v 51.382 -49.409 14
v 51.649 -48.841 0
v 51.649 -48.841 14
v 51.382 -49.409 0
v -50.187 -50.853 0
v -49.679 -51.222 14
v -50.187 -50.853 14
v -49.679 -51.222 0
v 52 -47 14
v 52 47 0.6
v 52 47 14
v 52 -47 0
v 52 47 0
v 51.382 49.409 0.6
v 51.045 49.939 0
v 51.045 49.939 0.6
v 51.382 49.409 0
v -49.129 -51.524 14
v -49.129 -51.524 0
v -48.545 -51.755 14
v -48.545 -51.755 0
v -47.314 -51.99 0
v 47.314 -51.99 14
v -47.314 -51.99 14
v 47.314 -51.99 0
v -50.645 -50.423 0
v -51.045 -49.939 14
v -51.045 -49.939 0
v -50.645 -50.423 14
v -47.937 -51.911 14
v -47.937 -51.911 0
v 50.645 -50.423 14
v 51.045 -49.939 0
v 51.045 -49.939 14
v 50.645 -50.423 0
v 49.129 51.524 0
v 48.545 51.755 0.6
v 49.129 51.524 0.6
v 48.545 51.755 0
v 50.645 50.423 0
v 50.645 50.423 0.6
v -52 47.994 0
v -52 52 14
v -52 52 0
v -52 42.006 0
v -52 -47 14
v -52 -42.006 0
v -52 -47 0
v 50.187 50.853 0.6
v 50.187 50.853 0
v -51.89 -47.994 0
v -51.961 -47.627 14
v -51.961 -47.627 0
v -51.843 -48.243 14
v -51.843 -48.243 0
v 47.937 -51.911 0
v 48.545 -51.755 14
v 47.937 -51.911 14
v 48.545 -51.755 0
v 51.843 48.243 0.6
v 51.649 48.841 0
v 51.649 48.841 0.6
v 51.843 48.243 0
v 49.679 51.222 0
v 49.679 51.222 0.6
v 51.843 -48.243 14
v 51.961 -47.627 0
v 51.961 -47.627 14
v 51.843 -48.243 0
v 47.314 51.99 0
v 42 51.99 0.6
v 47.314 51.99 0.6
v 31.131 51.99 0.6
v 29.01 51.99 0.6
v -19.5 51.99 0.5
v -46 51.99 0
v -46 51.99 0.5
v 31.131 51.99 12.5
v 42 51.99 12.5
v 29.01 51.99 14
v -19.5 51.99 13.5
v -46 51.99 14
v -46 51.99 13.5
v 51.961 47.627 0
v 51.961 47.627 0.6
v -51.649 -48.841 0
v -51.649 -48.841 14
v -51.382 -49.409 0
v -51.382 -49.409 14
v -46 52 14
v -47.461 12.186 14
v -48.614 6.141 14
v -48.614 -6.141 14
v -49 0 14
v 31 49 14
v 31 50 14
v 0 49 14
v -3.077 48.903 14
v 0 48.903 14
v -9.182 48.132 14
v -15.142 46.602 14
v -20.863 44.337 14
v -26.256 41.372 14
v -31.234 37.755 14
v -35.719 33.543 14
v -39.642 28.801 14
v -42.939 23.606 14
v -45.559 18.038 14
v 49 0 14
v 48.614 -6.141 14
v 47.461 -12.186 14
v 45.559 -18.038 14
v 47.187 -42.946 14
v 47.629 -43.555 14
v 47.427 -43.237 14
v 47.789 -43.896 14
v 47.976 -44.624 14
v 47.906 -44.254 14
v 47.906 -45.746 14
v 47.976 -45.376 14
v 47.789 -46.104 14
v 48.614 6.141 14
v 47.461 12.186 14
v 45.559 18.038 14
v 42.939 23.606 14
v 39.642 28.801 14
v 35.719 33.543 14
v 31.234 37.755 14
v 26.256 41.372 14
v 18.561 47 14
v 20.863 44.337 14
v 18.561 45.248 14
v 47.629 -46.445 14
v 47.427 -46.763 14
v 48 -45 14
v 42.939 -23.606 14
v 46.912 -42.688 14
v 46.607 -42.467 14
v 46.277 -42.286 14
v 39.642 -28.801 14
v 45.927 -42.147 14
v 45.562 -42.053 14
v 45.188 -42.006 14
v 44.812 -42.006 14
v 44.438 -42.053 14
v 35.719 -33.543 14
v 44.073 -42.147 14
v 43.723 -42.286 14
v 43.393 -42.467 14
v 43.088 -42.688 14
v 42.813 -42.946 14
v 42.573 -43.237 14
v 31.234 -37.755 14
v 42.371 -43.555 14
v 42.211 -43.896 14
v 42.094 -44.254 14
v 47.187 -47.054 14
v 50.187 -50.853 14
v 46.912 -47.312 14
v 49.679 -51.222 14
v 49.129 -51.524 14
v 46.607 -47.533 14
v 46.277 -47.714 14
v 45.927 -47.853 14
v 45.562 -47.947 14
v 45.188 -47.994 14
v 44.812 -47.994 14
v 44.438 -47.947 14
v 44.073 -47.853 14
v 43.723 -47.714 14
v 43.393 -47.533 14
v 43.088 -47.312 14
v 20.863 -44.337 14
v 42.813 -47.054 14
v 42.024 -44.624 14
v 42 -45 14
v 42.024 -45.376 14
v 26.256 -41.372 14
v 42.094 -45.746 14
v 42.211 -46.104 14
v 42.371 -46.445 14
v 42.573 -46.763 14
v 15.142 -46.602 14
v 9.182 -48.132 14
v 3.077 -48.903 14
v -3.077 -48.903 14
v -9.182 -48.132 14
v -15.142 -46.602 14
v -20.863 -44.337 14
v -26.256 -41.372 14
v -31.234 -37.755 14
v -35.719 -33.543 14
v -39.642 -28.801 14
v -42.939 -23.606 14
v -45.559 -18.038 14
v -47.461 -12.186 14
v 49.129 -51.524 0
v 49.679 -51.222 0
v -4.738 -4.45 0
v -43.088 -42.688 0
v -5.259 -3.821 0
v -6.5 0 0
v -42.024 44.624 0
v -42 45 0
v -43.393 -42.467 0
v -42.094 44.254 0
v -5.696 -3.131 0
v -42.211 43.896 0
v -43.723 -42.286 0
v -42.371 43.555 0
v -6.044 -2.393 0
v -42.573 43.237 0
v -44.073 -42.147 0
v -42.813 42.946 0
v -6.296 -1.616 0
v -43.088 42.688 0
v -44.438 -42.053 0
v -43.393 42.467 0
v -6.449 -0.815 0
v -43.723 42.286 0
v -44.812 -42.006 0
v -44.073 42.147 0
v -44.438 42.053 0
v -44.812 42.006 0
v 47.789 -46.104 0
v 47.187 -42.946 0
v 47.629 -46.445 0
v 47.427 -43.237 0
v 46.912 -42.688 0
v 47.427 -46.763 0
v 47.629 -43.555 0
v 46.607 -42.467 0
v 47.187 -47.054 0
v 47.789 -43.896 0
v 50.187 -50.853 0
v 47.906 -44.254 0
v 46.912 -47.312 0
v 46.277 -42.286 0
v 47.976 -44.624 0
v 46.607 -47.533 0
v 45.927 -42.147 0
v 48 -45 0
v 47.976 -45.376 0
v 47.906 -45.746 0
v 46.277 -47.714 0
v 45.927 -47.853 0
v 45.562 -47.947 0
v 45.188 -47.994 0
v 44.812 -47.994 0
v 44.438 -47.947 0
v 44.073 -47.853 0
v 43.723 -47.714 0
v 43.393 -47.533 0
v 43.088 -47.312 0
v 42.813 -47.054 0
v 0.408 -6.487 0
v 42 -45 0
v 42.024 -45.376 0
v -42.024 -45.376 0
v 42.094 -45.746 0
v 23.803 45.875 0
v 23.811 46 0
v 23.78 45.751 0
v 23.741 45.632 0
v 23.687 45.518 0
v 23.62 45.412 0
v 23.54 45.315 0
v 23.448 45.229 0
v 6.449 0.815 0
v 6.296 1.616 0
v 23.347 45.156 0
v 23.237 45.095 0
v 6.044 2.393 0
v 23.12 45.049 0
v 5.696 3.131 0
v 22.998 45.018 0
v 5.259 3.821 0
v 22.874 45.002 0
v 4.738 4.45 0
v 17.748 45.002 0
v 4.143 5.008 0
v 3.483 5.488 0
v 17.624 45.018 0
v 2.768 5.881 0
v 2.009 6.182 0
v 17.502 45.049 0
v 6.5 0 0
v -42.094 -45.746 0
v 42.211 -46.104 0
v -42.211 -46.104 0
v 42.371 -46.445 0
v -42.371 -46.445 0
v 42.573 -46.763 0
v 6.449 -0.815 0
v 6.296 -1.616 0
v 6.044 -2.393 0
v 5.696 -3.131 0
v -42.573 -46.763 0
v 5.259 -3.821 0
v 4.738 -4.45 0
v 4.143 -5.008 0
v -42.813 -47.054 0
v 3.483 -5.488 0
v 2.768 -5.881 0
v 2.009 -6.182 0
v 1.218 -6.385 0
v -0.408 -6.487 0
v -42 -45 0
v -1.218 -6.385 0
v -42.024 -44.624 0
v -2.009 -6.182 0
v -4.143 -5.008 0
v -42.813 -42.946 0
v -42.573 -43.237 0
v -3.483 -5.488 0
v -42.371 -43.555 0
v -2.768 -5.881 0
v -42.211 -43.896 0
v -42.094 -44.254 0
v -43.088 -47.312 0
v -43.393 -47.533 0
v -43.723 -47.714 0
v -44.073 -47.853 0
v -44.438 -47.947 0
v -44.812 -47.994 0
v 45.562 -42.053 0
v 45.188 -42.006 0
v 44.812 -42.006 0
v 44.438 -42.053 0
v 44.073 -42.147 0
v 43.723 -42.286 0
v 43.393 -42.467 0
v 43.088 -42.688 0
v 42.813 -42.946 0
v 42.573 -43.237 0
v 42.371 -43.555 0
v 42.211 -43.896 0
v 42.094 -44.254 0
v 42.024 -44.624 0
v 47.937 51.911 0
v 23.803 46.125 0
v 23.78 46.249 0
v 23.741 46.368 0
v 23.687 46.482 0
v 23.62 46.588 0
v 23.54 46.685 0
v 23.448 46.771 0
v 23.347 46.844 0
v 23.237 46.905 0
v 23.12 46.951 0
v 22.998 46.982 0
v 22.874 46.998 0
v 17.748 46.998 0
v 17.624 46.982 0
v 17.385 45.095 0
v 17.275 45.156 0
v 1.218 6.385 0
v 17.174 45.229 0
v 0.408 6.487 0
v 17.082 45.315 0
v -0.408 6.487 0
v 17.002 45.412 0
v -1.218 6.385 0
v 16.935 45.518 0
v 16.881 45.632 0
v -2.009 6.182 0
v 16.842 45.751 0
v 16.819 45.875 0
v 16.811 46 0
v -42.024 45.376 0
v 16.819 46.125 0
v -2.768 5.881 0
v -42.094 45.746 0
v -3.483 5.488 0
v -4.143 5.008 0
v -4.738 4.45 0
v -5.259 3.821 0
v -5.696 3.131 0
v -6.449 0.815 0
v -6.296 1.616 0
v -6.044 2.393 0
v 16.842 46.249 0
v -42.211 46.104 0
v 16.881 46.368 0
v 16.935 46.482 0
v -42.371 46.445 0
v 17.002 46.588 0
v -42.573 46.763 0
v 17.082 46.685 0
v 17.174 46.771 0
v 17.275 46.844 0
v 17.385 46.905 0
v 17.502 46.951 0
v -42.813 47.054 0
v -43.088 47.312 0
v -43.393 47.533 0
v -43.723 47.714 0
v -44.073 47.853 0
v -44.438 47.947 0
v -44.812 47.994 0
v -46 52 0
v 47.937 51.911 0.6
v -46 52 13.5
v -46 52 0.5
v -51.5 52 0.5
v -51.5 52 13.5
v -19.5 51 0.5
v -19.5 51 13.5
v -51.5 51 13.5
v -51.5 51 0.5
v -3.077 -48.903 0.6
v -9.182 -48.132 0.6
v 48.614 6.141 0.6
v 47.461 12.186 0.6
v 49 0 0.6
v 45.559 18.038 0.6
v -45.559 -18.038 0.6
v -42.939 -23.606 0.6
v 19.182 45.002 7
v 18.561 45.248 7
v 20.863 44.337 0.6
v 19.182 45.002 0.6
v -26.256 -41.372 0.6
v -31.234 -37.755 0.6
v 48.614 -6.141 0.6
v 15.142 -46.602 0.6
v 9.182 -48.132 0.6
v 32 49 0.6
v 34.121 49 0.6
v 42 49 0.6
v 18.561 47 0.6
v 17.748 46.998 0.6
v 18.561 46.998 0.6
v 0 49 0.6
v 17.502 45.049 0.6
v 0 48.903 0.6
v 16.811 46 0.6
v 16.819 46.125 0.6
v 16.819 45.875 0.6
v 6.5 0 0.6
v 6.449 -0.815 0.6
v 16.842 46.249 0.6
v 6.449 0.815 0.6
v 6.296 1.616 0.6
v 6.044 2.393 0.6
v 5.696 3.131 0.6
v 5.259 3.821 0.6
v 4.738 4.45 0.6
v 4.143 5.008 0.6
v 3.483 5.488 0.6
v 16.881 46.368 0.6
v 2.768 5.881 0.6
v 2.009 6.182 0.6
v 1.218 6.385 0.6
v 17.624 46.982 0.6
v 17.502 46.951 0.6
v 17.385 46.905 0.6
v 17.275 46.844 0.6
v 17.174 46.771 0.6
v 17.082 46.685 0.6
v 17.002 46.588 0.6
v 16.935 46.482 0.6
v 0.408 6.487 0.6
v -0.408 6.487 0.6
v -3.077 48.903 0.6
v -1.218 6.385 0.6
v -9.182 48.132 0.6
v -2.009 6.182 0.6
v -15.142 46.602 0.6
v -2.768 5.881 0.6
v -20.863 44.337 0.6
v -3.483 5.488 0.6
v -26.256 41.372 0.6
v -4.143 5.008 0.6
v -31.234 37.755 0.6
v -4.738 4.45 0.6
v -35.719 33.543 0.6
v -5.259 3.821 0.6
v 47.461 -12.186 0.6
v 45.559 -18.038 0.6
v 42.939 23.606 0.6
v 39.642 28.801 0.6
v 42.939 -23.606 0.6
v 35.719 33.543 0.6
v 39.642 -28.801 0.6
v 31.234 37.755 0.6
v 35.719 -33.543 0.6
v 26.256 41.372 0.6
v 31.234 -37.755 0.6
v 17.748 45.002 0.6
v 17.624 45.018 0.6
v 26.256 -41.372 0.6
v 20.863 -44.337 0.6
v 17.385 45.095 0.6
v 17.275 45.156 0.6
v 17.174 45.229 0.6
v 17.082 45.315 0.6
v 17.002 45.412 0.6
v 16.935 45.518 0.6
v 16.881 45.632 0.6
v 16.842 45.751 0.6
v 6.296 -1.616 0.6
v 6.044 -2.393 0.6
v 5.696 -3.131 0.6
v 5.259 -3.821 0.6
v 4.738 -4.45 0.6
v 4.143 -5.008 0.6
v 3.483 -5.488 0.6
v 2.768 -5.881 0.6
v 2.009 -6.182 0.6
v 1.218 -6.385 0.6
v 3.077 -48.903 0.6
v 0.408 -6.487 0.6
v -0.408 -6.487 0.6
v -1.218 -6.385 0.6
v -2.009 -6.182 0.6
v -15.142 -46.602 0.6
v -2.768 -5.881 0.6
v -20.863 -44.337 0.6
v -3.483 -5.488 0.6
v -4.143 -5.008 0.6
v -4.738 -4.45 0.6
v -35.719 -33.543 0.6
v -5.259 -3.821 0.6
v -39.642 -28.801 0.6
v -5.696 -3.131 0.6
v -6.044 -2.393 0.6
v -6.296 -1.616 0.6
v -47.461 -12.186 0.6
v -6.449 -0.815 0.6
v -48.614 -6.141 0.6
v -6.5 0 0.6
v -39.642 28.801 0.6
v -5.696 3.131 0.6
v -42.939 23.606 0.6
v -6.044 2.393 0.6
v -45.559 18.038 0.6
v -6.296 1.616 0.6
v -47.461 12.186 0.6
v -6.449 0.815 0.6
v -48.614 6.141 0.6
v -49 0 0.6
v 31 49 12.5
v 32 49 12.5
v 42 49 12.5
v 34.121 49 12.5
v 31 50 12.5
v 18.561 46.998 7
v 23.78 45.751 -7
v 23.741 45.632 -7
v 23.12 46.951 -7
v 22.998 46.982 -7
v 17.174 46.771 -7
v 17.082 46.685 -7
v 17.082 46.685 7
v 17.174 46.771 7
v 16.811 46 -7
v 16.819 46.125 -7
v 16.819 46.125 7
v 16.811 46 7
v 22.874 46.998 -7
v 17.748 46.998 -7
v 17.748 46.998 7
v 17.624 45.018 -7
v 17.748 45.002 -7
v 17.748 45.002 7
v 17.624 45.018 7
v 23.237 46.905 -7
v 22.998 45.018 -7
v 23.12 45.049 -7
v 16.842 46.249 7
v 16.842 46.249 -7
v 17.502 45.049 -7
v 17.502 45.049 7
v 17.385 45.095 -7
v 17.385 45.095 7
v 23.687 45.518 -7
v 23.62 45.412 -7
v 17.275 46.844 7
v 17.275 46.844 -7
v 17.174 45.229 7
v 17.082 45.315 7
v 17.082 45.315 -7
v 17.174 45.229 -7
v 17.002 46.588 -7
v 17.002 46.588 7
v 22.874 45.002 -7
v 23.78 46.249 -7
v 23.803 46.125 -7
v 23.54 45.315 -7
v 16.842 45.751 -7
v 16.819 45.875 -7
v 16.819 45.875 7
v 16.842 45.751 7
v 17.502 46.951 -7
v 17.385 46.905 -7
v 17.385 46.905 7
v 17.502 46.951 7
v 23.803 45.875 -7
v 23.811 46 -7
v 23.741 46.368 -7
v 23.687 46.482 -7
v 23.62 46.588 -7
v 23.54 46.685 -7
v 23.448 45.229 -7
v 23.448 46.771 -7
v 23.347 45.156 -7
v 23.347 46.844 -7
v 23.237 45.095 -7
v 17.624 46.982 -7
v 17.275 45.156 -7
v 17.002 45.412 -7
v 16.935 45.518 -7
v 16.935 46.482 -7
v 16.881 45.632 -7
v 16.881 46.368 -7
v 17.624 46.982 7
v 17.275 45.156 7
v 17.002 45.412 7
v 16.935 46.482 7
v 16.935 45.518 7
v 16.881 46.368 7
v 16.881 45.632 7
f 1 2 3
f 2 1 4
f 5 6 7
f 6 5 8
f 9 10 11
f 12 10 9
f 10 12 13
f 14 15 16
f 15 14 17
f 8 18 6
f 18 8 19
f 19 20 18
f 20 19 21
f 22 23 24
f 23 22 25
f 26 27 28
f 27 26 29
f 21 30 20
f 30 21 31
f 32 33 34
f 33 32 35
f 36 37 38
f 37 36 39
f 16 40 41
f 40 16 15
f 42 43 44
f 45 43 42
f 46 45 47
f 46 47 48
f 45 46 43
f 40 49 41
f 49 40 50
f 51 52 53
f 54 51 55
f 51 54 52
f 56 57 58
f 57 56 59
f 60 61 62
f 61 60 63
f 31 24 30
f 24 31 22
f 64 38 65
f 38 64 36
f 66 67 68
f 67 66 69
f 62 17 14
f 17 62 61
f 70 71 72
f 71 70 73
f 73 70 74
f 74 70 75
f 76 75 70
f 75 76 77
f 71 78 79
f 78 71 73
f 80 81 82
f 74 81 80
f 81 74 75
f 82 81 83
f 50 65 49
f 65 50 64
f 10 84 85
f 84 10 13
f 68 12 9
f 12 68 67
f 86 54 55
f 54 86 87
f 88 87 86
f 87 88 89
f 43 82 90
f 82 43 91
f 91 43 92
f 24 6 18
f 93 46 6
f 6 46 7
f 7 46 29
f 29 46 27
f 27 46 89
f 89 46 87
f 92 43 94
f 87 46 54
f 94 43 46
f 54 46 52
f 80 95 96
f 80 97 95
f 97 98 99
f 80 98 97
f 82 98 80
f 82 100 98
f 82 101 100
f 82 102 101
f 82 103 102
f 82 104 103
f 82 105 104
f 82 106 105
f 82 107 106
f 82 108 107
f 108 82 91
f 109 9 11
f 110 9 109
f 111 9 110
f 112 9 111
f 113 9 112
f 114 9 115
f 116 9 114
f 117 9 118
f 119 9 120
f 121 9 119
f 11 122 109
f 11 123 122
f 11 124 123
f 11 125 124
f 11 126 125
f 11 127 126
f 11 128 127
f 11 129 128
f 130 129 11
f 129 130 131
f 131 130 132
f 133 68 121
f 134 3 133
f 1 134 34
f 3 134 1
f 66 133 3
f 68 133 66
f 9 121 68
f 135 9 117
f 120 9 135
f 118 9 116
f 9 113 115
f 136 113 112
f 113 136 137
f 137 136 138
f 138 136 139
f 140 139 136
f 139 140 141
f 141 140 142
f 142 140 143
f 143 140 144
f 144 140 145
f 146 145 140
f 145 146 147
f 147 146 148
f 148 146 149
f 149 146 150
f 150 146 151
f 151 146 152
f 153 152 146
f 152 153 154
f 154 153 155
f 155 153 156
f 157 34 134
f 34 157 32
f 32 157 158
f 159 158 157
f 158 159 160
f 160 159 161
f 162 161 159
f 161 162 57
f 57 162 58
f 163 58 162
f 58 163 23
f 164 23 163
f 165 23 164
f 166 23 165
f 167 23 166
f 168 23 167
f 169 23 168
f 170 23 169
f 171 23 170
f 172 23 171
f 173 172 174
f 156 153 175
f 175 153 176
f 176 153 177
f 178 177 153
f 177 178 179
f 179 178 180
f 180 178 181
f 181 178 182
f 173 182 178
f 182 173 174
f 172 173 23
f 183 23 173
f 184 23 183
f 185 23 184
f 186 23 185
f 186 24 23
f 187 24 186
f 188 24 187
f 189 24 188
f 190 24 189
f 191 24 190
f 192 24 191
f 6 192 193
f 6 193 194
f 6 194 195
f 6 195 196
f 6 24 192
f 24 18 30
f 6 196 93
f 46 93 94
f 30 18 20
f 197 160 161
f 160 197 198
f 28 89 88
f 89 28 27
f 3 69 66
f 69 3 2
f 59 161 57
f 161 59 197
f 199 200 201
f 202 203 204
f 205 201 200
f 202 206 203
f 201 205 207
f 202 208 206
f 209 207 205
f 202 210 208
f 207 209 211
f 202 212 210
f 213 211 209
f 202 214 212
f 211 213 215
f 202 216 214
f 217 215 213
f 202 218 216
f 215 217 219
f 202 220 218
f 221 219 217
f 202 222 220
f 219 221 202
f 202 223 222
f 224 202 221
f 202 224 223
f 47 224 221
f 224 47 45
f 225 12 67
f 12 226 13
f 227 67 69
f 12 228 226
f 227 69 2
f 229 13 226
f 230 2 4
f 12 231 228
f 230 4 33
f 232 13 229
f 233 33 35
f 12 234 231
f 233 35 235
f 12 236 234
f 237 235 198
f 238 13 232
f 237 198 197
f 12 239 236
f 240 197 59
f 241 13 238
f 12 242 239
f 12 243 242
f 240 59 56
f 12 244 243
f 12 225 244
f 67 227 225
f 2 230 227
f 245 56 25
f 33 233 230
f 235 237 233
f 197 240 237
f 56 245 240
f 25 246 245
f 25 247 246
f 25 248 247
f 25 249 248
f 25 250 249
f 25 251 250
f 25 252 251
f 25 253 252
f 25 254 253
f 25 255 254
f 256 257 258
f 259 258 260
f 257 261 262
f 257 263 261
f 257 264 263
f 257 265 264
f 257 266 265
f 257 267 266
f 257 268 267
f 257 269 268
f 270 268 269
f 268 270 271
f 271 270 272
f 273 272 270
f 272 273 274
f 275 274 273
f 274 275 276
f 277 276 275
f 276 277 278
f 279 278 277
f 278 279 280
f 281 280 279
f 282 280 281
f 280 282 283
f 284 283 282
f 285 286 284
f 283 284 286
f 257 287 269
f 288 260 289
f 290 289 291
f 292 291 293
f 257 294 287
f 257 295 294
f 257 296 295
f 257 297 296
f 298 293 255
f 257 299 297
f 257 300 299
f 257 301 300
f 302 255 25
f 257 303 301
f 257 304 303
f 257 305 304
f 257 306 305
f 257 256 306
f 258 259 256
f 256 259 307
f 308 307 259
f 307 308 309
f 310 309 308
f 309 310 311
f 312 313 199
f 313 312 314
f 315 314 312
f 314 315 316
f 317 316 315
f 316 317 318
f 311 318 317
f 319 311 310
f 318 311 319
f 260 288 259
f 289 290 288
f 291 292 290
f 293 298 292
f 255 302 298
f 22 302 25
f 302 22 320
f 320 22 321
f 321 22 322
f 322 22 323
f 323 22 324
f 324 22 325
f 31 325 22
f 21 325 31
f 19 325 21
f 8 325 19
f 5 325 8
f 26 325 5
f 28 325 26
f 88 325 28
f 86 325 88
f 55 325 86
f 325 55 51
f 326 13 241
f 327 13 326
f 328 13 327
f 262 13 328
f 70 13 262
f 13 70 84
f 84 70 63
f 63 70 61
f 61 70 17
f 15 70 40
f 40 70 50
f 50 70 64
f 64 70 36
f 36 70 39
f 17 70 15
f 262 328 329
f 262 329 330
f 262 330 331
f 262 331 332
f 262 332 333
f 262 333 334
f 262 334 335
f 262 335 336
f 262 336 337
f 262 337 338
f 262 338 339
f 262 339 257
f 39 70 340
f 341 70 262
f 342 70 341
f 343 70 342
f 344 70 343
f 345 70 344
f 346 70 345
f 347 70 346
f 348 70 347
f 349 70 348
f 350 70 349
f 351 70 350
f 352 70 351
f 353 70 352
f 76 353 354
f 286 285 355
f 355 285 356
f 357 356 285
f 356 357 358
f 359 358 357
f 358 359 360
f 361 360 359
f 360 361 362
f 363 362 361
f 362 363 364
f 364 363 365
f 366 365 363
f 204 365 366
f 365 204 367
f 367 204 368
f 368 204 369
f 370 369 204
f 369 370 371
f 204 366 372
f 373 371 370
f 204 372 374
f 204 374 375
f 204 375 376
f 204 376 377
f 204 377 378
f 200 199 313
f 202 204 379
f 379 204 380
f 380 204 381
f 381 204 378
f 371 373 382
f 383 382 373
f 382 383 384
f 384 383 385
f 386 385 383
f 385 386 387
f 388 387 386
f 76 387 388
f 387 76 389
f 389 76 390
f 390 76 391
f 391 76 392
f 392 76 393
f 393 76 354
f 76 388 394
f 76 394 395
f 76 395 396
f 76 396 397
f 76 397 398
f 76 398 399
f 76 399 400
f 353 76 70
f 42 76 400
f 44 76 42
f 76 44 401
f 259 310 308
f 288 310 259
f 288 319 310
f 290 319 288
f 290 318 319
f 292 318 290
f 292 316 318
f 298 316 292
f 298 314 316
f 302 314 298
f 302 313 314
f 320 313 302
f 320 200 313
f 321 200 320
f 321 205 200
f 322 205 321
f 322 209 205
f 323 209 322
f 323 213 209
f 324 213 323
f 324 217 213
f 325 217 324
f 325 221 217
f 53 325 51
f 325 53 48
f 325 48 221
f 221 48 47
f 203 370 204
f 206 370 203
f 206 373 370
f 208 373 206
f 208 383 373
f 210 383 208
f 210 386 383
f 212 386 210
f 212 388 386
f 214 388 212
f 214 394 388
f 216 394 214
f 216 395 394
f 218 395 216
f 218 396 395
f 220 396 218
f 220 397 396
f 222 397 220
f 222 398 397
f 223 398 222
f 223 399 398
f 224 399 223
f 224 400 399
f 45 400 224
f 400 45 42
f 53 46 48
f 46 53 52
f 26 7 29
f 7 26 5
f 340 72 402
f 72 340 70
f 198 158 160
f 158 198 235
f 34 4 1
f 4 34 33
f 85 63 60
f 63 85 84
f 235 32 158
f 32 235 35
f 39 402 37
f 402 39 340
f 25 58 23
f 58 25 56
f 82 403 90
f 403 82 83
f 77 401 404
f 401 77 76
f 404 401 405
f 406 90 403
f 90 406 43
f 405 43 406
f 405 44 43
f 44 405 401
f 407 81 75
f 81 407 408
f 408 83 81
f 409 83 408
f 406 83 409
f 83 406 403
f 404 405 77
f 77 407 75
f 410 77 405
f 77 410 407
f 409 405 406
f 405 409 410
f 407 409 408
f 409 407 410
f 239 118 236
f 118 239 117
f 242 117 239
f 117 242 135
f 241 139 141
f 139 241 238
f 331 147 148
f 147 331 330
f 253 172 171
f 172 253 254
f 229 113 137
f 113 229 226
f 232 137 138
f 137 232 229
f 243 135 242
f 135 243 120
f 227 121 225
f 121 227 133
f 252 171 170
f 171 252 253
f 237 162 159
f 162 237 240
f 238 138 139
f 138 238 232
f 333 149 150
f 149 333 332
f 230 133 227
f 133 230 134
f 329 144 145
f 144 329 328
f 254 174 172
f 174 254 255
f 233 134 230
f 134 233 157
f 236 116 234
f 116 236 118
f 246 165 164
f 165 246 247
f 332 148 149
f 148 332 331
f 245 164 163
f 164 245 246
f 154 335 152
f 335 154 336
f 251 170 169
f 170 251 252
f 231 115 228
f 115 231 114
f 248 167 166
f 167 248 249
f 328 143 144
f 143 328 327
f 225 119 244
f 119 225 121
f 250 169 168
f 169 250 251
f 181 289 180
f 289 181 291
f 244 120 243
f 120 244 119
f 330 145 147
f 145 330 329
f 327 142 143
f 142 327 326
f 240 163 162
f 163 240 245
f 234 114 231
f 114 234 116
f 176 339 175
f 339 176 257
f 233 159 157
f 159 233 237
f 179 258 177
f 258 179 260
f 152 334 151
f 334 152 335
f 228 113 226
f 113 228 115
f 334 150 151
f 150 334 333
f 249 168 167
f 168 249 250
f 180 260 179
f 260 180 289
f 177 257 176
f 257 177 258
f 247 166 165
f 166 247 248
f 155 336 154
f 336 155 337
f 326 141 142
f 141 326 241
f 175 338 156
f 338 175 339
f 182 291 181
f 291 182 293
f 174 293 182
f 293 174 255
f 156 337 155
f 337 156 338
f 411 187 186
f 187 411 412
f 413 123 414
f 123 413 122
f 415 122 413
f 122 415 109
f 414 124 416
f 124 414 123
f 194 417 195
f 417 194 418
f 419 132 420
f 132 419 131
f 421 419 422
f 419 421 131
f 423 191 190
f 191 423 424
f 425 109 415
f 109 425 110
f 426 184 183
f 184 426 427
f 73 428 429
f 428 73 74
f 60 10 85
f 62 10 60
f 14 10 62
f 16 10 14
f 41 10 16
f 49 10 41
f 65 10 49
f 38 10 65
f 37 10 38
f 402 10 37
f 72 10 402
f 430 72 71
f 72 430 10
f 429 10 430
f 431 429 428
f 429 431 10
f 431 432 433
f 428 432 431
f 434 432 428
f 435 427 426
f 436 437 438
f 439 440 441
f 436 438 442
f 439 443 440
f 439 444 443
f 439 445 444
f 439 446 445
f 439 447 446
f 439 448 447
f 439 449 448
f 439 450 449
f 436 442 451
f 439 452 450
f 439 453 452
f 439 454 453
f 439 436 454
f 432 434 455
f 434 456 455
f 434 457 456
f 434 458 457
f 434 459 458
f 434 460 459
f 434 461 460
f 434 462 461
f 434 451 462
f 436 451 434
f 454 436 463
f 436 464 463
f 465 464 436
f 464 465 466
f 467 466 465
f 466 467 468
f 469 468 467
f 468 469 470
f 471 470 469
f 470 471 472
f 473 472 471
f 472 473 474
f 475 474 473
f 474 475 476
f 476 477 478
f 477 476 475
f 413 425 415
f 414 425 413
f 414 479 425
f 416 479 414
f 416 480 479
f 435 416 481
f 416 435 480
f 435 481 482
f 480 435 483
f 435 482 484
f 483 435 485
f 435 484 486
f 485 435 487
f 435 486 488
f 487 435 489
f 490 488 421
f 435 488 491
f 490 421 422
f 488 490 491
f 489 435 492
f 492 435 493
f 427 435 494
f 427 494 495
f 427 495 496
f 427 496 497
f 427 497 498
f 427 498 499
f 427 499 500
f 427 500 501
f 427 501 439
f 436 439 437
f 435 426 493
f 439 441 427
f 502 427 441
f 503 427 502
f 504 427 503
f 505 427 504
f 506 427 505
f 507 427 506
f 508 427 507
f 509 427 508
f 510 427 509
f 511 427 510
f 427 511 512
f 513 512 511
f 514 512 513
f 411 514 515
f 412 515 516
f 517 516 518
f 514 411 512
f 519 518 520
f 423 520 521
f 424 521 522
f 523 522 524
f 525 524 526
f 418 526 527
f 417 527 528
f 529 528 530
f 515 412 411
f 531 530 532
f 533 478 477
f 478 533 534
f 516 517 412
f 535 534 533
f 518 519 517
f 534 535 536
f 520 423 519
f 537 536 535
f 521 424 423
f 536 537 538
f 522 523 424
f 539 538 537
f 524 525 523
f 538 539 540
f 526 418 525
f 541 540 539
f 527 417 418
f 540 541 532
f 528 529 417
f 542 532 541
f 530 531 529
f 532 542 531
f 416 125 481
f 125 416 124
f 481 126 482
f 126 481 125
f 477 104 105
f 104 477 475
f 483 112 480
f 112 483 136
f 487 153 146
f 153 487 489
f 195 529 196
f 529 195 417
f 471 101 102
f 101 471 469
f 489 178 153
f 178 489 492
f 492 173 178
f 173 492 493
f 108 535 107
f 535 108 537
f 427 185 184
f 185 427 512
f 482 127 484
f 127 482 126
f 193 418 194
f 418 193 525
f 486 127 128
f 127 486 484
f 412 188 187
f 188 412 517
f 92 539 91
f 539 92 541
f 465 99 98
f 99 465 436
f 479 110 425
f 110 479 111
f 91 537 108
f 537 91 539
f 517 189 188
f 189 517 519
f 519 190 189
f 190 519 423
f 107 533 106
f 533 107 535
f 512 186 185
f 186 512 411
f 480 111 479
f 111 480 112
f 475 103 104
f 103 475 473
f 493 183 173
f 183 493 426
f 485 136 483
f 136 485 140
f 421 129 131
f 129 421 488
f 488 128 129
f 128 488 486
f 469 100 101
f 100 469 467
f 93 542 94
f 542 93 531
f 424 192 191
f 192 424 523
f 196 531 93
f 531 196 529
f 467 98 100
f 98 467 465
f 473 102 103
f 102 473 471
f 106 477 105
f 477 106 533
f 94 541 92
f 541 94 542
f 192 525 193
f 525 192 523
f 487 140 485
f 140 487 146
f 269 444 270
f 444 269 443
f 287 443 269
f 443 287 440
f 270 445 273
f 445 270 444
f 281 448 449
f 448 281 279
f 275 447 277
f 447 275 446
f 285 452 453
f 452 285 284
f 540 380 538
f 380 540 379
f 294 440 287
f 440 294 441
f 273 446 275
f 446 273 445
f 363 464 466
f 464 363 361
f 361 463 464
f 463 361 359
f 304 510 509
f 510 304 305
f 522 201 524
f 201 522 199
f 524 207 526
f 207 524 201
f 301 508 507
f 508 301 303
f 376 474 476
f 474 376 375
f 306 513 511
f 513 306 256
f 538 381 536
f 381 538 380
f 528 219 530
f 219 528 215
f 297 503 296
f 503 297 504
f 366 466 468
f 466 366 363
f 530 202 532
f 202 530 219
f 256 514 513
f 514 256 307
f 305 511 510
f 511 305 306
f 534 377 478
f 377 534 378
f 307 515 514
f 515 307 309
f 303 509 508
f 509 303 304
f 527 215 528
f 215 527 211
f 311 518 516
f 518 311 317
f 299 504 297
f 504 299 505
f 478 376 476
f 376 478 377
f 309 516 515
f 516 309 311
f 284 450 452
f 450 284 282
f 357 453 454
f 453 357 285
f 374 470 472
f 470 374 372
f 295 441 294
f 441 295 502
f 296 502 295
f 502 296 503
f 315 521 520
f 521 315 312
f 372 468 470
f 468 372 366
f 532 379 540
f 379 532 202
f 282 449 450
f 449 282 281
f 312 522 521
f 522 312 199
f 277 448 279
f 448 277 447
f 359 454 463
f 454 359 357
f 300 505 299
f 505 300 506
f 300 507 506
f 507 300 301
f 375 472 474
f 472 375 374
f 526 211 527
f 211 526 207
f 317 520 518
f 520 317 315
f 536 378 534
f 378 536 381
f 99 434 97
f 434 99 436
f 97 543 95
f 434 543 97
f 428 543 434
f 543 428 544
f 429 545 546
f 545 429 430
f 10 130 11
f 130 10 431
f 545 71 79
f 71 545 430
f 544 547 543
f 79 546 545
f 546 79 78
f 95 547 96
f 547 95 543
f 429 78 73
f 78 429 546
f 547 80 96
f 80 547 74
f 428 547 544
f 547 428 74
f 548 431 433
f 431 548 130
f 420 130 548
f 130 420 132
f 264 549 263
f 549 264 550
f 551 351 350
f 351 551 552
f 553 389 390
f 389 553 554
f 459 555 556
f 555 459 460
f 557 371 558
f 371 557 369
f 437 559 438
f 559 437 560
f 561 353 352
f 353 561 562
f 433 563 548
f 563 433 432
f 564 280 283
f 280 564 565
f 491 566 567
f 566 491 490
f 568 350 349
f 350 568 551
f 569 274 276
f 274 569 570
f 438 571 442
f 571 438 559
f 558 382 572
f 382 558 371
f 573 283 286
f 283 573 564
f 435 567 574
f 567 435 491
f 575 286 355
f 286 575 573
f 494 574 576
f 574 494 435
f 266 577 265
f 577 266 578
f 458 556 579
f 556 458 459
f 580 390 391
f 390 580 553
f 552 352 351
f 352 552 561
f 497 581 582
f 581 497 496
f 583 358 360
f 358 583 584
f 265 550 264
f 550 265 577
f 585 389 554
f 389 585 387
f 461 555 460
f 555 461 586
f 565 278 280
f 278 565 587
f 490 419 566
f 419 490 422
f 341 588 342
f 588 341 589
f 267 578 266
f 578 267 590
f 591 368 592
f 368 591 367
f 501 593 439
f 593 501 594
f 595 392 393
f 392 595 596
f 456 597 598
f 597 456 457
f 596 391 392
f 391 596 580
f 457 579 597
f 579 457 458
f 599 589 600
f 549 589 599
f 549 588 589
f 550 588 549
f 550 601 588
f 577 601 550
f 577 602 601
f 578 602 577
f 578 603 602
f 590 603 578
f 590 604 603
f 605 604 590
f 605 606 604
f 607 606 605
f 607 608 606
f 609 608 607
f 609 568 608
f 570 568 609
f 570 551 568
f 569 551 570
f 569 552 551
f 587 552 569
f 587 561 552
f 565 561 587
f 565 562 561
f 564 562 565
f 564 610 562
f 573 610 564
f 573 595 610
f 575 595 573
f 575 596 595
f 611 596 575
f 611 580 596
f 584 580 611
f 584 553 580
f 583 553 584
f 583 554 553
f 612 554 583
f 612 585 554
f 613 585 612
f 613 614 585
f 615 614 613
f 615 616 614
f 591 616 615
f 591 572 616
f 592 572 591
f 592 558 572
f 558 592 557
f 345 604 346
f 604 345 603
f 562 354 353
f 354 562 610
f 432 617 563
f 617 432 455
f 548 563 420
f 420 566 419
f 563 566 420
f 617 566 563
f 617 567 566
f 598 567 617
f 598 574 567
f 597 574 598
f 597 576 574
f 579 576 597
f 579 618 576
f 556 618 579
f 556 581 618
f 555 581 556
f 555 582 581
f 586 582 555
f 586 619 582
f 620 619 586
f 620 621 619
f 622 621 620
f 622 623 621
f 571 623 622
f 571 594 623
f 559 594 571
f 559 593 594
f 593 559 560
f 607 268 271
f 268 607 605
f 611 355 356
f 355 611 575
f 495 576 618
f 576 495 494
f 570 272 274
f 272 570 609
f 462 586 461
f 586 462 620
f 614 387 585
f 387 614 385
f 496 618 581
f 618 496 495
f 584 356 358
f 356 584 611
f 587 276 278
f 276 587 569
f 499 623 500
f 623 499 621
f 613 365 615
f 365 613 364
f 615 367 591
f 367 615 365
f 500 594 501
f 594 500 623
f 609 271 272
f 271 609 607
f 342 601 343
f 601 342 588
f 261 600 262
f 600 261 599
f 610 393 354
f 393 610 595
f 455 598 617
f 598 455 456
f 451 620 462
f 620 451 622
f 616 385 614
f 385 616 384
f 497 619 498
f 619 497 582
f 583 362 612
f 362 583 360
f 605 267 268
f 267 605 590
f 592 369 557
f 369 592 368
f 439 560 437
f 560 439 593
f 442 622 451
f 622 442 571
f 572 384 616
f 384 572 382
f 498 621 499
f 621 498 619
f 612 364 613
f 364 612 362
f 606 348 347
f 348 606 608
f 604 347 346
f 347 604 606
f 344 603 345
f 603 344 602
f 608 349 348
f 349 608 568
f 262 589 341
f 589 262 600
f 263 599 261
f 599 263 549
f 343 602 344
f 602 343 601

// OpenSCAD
$fn = 50;


union() {
	difference() {
		union() {
			hull() {
				translate(v = [-47.0000000000, 47.0000000000, 0]) {
					cylinder(h = 14, r = 5);
				}
				translate(v = [47.0000000000, 47.0000000000, 0]) {
					cylinder(h = 14, r = 5);
				}
				translate(v = [-47.0000000000, -47.0000000000, 0]) {
					cylinder(h = 14, r = 5);
				}
				translate(v = [47.0000000000, -47.0000000000, 0]) {
					cylinder(h = 14, r = 5);
				}
			}
			translate(v = [-52.0000000000, 46.0000000000, 0]) {
				cube(size = [6, 6, 14]);
			}
		}
		union() {
			translate(v = [-52.5000000000, -45.0000000000, -250.0000000000]) {
				rotate(a = [0, 0, 0]) {
					difference() {
						union() {
							hull() {
								translate(v = [7.5000000000, 0, 0]) {
									cylinder(h = 250, r = 3.0000000000, r1 = 3.0000000000, r2 = 3.0000000000);
								}
								translate(v = [-7.5000000000, 0, 0]) {
									cylinder(h = 250, r = 3.0000000000, r1 = 3.0000000000, r2 = 3.0000000000);
								}
							}
						}
						union();
					}
				}
			}
			translate(v = [-52.5000000000, 45.0000000000, -250.0000000000]) {
				rotate(a = [0, 0, 0]) {
					difference() {
						union() {
							hull() {
								translate(v = [7.5000000000, 0, 0]) {
									cylinder(h = 250, r = 3.0000000000, r1 = 3.0000000000, r2 = 3.0000000000);
								}
								translate(v = [-7.5000000000, 0, 0]) {
									cylinder(h = 250, r = 3.0000000000, r1 = 3.0000000000, r2 = 3.0000000000);
								}
							}
						}
						union();
					}
				}
			}
			translate(v = [-51.5000000000, 51.0000000000, 0.5000000000]) {
				cube(size = [32, 1, 13.0000000000]);
			}
			translate(v = [45.0000000000, -45.0000000000, 0]) {
				cylinder(h = 100, r = 3.0000000000);
			}
			translate(v = [0, 0, 0.6000000000]) {
				cylinder(h = 16.4000000000, r = 49.0000000000);
			}
			translate(v = [0, 0, -7.0000000000]) {
				cylinder(h = 14, r = 6.5000000000);
			}
			translate(v = [0.0000000000, 47.0000000000, 0.6000000000]) {
				cube(size = [52.0000000000, 2, 16.4000000000]);
			}
			translate(v = [42.0000000000, 47.0000000000, 0.6000000000]) {
				cube(size = [10, 5, 16.4000000000]);
			}
			translate(v = [31.0000000000, 47.0000000000, 12.5000000000]) {
				cube(size = [21, 5, 1.5000000000]);
			}
			translate(v = [28.2500000000, 52.7500000000, 0.6000000000]) {
				rotate(a = [0, 0, -45]) {
					cube(size = [7.5000000000, 1.5000000000, 16.4000000000]);
				}
			}
			translate(v = [11.0610000000, 45.0000000000, 0.6000000000]) {
				cube(size = [7.5000000000, 2, 13.4000000000]);
			}
		}
	}
	union() {
		translate(v = [20.3110000000, 46.0000000000, -7.0000000000]) {
			rotate(a = [0, 0, 0]) {
				difference() {
					union() {
						#hull() {
							#translate(v = [2.5000000000, 0, 0]) {
								cylinder(h = 14, r = 1.0000000000, r1 = 1.0000000000, r2 = 1.0000000000);
							}
							#translate(v = [-2.5000000000, 0, 0]) {
								cylinder(h = 14, r = 1.0000000000, r1 = 1.0000000000, r2 = 1.0000000000);
							}
						}
					}
					union();
				}
			}
		}
	}
}
